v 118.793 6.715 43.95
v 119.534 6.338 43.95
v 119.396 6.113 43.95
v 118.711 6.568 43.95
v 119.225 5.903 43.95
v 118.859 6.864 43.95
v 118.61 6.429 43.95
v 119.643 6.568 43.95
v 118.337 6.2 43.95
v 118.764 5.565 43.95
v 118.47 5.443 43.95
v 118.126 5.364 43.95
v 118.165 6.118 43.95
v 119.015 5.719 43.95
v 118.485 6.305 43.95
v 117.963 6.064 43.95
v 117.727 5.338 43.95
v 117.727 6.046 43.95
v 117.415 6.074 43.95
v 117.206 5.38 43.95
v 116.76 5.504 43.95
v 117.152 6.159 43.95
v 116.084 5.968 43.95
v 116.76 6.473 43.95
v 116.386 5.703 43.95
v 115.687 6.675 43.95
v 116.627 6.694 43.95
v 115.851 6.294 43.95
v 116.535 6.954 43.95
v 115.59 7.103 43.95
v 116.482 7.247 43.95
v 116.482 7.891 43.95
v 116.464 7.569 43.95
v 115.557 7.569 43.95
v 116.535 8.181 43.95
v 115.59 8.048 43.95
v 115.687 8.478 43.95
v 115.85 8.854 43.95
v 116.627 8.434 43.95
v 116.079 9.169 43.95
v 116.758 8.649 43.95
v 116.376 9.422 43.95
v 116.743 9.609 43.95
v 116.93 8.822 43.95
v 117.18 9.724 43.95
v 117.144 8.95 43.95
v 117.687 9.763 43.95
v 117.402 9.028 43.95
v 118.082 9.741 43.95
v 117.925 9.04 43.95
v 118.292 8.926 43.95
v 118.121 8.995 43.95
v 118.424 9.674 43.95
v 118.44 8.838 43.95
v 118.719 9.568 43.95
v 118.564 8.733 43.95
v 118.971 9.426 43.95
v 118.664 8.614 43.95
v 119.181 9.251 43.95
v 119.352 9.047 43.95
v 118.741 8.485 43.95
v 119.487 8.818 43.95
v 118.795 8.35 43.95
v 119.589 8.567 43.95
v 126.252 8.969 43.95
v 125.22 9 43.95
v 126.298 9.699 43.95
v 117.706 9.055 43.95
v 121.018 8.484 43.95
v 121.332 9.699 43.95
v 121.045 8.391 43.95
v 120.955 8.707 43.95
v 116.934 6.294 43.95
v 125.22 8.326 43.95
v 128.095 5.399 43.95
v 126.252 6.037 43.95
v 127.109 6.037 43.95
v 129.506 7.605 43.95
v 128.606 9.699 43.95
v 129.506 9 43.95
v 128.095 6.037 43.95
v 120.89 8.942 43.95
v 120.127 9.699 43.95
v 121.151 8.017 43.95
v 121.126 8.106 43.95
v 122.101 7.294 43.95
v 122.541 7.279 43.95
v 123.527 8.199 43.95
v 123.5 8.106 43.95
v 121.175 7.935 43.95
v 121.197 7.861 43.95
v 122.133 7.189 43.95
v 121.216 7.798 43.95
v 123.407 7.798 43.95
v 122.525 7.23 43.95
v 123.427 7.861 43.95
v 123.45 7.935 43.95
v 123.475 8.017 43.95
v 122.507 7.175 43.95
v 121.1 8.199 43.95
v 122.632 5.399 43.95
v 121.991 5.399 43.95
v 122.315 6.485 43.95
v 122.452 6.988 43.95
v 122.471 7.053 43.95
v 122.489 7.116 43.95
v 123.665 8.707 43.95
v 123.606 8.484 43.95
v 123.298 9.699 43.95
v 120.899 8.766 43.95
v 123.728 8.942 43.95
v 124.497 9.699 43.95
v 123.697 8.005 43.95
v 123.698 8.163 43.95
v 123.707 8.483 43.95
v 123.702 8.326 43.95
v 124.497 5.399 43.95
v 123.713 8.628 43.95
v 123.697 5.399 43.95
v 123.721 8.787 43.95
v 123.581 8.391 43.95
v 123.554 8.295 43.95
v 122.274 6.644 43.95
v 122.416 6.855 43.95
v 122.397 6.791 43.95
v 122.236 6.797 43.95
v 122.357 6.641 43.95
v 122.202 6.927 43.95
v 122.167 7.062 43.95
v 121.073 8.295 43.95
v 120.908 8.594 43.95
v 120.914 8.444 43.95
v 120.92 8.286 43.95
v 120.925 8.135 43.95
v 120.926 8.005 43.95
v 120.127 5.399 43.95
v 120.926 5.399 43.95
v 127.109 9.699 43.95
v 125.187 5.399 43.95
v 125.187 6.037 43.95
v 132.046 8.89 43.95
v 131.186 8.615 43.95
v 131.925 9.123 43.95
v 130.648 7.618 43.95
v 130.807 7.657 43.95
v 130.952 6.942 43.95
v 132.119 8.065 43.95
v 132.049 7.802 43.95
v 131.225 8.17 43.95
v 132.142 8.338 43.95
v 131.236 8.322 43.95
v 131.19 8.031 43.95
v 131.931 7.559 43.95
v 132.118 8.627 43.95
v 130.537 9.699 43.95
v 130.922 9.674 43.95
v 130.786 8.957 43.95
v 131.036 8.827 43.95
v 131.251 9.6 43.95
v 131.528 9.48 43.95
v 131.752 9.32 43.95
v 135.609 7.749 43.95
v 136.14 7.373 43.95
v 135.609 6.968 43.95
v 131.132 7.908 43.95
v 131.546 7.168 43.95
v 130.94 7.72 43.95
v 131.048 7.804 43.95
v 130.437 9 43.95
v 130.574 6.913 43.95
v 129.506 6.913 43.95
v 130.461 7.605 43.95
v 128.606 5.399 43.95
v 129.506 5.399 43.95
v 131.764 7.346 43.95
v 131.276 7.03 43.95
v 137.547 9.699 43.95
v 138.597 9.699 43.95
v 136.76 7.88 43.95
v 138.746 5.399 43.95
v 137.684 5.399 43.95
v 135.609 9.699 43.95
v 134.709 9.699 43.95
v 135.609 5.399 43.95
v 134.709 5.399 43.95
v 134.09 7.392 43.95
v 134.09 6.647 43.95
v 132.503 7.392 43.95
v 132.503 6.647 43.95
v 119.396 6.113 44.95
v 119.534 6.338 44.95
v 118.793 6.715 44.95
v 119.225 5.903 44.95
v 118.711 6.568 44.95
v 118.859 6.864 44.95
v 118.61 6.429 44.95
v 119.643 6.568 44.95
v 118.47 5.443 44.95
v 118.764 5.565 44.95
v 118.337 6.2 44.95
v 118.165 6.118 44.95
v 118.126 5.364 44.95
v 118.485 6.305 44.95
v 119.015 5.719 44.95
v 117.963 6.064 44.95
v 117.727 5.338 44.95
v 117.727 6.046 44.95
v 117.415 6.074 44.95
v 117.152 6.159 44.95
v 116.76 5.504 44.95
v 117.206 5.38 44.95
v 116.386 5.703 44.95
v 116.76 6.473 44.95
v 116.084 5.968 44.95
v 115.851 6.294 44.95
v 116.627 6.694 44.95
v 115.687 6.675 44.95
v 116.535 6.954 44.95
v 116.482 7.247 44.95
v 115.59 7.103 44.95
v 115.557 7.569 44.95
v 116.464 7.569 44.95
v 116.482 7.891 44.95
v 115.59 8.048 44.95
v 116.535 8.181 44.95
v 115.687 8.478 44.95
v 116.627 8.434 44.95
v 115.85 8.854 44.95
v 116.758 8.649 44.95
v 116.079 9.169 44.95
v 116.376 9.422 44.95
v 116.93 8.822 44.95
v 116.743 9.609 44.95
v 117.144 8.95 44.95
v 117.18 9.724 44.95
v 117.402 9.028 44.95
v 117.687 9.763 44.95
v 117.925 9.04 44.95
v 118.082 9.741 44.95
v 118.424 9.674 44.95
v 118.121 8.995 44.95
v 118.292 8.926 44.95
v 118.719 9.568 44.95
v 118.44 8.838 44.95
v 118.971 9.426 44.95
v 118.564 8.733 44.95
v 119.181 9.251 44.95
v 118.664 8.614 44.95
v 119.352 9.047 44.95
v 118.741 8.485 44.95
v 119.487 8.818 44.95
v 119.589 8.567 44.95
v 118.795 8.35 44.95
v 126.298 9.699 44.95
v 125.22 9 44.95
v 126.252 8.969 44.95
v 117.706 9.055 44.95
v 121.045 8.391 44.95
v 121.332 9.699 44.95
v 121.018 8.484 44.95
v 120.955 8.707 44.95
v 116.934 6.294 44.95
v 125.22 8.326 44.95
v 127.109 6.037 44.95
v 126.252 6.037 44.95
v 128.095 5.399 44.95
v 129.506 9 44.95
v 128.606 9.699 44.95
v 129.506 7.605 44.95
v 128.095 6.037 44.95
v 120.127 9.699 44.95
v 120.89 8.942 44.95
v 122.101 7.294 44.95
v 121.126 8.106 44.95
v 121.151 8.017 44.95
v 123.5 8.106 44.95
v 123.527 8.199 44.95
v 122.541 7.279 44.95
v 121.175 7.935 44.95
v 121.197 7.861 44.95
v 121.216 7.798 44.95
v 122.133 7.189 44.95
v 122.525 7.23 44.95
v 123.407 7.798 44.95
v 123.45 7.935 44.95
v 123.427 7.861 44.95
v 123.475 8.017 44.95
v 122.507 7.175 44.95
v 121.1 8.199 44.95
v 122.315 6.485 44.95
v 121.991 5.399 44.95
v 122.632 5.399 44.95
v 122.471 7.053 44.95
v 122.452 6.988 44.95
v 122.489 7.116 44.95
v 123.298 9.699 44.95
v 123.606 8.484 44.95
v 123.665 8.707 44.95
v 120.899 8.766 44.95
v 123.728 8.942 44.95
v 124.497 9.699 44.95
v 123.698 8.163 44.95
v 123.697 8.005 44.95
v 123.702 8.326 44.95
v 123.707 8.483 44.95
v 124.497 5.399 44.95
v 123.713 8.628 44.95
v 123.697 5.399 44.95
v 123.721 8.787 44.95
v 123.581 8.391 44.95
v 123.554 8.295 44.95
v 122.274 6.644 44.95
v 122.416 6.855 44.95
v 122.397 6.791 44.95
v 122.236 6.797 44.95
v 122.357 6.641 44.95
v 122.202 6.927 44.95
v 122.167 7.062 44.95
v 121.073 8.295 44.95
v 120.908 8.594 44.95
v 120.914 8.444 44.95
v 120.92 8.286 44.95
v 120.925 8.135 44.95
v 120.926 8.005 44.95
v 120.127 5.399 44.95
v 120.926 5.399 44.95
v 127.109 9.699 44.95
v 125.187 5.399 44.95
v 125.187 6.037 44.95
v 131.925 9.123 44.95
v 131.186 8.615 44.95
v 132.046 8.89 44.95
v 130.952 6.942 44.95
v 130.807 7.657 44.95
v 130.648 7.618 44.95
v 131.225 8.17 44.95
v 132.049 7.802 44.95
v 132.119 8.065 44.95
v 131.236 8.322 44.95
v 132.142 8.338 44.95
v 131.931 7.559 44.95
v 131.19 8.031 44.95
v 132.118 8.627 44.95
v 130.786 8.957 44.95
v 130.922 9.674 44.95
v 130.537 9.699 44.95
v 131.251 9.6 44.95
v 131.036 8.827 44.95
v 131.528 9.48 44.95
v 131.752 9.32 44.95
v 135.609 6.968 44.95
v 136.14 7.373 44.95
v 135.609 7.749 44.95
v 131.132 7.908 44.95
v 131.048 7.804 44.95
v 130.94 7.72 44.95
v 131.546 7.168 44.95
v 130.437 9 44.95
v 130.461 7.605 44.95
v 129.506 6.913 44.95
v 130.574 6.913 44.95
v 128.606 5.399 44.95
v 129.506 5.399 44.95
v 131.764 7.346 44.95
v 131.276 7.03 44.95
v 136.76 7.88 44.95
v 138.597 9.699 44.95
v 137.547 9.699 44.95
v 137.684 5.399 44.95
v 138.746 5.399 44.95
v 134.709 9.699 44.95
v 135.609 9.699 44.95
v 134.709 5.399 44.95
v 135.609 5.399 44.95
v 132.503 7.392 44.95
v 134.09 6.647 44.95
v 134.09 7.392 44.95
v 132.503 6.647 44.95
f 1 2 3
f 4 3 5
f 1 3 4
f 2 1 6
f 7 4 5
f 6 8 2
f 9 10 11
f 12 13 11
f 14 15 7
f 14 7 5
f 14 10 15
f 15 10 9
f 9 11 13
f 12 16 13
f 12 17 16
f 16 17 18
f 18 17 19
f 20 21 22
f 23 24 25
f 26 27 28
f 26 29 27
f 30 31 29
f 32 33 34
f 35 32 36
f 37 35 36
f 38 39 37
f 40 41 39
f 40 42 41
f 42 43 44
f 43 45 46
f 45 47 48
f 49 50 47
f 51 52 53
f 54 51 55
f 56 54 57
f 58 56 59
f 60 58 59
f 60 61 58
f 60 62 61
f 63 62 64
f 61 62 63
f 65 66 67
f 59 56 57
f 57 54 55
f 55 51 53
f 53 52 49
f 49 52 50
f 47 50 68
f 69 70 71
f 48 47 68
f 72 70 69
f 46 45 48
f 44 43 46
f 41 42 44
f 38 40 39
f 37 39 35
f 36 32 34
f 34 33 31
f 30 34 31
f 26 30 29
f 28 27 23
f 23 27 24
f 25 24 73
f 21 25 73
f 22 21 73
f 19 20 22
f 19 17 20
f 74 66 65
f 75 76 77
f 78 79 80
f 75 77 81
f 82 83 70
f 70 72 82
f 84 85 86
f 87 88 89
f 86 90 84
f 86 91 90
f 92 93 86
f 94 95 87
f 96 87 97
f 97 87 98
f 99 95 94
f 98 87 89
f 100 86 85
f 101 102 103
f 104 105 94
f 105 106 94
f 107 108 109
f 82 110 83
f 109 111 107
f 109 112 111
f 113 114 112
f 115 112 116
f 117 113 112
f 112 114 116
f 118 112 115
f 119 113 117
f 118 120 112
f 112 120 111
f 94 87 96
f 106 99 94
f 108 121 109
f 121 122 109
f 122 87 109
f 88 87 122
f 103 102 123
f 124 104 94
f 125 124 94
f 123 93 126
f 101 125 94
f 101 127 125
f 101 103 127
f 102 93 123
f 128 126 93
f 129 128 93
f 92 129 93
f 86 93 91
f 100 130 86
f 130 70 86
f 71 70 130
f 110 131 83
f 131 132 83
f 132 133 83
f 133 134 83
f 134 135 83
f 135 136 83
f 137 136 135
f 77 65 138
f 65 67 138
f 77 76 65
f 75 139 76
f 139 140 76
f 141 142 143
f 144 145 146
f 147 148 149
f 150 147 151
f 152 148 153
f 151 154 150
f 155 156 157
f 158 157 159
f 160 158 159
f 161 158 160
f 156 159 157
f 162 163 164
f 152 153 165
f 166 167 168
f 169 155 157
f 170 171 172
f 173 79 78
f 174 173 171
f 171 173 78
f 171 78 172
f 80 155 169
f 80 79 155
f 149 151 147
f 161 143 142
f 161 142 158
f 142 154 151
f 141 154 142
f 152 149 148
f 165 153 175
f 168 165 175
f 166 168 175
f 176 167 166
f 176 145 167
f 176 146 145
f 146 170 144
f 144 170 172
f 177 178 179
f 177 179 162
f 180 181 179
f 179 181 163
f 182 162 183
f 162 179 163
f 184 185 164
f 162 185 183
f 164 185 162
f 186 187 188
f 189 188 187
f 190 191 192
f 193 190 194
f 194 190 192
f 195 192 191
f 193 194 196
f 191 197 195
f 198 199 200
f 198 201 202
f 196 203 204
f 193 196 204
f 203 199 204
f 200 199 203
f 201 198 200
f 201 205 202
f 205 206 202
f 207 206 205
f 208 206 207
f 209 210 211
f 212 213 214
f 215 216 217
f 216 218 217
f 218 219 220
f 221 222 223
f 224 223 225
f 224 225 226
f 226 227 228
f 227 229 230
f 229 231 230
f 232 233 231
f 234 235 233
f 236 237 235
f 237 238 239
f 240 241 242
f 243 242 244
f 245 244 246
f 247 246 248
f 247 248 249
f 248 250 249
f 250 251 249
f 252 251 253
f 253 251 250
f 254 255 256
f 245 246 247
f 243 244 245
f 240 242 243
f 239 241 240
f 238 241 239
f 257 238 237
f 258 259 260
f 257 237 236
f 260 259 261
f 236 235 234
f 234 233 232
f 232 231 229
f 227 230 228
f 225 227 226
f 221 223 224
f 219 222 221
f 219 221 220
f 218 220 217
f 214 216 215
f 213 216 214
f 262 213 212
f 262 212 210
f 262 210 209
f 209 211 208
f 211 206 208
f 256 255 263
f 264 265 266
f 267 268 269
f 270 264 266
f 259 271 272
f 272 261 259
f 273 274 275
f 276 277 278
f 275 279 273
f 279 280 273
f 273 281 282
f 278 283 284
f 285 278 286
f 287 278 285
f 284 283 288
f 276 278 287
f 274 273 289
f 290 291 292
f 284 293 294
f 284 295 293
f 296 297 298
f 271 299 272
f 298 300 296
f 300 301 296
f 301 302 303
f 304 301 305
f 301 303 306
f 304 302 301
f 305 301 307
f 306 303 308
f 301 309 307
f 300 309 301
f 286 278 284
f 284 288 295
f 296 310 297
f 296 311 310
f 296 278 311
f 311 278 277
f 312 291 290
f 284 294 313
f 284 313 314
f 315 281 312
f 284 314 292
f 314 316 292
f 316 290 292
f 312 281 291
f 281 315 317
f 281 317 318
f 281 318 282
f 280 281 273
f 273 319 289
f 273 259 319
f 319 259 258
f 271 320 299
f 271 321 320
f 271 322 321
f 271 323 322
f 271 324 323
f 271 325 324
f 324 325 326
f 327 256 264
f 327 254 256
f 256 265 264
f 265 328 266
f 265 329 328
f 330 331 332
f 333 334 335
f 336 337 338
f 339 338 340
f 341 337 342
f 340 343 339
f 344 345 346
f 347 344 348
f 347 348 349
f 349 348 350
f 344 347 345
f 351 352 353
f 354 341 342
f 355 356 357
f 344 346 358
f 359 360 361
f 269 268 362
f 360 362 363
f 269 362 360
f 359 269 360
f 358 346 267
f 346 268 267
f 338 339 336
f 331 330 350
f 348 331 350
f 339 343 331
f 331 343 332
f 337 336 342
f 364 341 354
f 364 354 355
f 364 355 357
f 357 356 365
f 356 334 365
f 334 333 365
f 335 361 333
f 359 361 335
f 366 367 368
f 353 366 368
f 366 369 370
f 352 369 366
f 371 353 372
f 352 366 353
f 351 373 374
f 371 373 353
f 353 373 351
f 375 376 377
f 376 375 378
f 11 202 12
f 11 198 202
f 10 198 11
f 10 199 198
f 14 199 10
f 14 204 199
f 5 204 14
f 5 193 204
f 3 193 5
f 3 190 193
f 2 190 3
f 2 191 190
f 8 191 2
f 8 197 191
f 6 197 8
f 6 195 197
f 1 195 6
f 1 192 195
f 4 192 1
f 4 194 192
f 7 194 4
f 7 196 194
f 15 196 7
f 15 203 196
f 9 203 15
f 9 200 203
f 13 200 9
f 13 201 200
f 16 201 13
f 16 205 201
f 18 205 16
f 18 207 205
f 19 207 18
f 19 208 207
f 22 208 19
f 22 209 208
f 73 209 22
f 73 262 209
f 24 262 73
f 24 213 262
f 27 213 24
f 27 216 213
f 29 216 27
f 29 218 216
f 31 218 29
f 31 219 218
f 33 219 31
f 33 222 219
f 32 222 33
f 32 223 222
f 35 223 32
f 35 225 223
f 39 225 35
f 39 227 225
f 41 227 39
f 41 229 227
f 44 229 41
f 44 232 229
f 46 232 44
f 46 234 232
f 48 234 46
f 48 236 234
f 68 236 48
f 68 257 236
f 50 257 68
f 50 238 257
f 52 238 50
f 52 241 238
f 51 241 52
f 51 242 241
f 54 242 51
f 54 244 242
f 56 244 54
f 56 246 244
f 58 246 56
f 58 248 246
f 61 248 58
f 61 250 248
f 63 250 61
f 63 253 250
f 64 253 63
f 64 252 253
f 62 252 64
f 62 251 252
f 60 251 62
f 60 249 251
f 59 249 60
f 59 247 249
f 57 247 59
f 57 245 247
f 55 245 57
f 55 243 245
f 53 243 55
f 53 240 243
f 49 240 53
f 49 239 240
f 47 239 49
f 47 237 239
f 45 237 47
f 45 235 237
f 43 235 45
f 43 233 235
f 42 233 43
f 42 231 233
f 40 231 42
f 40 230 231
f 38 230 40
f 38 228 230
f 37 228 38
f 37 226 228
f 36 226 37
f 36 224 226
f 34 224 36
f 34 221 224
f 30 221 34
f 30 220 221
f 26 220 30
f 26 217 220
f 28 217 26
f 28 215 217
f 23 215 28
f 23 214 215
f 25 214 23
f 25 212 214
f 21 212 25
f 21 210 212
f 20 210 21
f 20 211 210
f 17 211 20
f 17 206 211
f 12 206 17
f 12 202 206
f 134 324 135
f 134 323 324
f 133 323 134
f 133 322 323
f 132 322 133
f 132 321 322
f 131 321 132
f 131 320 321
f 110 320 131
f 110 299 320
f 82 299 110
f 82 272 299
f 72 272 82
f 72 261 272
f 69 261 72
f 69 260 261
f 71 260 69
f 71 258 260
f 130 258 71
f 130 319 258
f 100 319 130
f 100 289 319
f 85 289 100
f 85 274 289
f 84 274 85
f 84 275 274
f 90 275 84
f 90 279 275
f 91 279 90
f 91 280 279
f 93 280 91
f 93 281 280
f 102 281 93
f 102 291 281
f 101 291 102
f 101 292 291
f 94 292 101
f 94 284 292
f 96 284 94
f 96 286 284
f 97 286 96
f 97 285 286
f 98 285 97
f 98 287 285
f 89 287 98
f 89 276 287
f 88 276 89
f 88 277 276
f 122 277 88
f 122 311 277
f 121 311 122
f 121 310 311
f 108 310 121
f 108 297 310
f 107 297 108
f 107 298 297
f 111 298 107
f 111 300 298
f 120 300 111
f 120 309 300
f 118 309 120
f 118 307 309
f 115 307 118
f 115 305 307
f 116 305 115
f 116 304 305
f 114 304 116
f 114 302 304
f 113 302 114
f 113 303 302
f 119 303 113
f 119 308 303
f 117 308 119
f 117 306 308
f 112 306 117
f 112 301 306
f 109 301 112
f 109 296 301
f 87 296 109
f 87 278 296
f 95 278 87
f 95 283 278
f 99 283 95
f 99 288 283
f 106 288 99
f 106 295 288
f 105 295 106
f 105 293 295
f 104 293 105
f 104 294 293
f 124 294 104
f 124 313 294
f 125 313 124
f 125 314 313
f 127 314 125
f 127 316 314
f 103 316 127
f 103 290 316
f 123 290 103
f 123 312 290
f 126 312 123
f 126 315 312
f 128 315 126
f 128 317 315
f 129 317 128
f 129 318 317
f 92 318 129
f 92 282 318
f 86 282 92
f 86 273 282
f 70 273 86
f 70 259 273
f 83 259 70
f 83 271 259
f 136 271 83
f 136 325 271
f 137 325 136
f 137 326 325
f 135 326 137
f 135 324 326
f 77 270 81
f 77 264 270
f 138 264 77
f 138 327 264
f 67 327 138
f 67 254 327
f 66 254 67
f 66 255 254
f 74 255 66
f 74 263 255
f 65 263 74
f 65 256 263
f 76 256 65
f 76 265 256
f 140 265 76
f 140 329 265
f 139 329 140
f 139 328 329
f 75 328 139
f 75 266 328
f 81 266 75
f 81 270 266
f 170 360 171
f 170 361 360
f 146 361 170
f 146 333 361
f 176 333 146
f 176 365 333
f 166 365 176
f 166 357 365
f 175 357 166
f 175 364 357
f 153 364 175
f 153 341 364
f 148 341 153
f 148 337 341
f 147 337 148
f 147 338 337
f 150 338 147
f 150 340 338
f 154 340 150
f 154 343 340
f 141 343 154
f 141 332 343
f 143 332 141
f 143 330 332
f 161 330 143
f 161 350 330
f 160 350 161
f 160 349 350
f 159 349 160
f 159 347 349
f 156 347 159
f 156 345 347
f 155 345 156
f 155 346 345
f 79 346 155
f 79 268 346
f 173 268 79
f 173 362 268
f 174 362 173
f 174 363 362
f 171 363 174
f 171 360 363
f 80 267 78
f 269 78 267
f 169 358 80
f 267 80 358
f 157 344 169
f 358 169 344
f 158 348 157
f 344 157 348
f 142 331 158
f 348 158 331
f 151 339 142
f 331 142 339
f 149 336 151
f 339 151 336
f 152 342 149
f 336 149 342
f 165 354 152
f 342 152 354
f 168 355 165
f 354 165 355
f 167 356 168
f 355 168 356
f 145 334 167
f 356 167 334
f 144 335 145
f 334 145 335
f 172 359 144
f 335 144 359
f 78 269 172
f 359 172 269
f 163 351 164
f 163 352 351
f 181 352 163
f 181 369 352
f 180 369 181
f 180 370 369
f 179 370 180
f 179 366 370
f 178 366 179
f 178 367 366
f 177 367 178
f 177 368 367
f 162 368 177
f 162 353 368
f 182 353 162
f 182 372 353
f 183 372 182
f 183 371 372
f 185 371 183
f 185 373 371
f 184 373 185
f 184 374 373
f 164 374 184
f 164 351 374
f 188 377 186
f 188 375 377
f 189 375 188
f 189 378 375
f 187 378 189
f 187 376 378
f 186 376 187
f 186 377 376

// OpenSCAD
// CM1P-K ID text, engraved 0.5 into the plate's top face (frame as cm1p_k_freecad.py).
translate([127, 7.5, 43.95]) linear_extrude(1) text("CM1P-K", size = 4.5, font = "Liberation Sans:style=Bold", halign = "center", valign = "center");
